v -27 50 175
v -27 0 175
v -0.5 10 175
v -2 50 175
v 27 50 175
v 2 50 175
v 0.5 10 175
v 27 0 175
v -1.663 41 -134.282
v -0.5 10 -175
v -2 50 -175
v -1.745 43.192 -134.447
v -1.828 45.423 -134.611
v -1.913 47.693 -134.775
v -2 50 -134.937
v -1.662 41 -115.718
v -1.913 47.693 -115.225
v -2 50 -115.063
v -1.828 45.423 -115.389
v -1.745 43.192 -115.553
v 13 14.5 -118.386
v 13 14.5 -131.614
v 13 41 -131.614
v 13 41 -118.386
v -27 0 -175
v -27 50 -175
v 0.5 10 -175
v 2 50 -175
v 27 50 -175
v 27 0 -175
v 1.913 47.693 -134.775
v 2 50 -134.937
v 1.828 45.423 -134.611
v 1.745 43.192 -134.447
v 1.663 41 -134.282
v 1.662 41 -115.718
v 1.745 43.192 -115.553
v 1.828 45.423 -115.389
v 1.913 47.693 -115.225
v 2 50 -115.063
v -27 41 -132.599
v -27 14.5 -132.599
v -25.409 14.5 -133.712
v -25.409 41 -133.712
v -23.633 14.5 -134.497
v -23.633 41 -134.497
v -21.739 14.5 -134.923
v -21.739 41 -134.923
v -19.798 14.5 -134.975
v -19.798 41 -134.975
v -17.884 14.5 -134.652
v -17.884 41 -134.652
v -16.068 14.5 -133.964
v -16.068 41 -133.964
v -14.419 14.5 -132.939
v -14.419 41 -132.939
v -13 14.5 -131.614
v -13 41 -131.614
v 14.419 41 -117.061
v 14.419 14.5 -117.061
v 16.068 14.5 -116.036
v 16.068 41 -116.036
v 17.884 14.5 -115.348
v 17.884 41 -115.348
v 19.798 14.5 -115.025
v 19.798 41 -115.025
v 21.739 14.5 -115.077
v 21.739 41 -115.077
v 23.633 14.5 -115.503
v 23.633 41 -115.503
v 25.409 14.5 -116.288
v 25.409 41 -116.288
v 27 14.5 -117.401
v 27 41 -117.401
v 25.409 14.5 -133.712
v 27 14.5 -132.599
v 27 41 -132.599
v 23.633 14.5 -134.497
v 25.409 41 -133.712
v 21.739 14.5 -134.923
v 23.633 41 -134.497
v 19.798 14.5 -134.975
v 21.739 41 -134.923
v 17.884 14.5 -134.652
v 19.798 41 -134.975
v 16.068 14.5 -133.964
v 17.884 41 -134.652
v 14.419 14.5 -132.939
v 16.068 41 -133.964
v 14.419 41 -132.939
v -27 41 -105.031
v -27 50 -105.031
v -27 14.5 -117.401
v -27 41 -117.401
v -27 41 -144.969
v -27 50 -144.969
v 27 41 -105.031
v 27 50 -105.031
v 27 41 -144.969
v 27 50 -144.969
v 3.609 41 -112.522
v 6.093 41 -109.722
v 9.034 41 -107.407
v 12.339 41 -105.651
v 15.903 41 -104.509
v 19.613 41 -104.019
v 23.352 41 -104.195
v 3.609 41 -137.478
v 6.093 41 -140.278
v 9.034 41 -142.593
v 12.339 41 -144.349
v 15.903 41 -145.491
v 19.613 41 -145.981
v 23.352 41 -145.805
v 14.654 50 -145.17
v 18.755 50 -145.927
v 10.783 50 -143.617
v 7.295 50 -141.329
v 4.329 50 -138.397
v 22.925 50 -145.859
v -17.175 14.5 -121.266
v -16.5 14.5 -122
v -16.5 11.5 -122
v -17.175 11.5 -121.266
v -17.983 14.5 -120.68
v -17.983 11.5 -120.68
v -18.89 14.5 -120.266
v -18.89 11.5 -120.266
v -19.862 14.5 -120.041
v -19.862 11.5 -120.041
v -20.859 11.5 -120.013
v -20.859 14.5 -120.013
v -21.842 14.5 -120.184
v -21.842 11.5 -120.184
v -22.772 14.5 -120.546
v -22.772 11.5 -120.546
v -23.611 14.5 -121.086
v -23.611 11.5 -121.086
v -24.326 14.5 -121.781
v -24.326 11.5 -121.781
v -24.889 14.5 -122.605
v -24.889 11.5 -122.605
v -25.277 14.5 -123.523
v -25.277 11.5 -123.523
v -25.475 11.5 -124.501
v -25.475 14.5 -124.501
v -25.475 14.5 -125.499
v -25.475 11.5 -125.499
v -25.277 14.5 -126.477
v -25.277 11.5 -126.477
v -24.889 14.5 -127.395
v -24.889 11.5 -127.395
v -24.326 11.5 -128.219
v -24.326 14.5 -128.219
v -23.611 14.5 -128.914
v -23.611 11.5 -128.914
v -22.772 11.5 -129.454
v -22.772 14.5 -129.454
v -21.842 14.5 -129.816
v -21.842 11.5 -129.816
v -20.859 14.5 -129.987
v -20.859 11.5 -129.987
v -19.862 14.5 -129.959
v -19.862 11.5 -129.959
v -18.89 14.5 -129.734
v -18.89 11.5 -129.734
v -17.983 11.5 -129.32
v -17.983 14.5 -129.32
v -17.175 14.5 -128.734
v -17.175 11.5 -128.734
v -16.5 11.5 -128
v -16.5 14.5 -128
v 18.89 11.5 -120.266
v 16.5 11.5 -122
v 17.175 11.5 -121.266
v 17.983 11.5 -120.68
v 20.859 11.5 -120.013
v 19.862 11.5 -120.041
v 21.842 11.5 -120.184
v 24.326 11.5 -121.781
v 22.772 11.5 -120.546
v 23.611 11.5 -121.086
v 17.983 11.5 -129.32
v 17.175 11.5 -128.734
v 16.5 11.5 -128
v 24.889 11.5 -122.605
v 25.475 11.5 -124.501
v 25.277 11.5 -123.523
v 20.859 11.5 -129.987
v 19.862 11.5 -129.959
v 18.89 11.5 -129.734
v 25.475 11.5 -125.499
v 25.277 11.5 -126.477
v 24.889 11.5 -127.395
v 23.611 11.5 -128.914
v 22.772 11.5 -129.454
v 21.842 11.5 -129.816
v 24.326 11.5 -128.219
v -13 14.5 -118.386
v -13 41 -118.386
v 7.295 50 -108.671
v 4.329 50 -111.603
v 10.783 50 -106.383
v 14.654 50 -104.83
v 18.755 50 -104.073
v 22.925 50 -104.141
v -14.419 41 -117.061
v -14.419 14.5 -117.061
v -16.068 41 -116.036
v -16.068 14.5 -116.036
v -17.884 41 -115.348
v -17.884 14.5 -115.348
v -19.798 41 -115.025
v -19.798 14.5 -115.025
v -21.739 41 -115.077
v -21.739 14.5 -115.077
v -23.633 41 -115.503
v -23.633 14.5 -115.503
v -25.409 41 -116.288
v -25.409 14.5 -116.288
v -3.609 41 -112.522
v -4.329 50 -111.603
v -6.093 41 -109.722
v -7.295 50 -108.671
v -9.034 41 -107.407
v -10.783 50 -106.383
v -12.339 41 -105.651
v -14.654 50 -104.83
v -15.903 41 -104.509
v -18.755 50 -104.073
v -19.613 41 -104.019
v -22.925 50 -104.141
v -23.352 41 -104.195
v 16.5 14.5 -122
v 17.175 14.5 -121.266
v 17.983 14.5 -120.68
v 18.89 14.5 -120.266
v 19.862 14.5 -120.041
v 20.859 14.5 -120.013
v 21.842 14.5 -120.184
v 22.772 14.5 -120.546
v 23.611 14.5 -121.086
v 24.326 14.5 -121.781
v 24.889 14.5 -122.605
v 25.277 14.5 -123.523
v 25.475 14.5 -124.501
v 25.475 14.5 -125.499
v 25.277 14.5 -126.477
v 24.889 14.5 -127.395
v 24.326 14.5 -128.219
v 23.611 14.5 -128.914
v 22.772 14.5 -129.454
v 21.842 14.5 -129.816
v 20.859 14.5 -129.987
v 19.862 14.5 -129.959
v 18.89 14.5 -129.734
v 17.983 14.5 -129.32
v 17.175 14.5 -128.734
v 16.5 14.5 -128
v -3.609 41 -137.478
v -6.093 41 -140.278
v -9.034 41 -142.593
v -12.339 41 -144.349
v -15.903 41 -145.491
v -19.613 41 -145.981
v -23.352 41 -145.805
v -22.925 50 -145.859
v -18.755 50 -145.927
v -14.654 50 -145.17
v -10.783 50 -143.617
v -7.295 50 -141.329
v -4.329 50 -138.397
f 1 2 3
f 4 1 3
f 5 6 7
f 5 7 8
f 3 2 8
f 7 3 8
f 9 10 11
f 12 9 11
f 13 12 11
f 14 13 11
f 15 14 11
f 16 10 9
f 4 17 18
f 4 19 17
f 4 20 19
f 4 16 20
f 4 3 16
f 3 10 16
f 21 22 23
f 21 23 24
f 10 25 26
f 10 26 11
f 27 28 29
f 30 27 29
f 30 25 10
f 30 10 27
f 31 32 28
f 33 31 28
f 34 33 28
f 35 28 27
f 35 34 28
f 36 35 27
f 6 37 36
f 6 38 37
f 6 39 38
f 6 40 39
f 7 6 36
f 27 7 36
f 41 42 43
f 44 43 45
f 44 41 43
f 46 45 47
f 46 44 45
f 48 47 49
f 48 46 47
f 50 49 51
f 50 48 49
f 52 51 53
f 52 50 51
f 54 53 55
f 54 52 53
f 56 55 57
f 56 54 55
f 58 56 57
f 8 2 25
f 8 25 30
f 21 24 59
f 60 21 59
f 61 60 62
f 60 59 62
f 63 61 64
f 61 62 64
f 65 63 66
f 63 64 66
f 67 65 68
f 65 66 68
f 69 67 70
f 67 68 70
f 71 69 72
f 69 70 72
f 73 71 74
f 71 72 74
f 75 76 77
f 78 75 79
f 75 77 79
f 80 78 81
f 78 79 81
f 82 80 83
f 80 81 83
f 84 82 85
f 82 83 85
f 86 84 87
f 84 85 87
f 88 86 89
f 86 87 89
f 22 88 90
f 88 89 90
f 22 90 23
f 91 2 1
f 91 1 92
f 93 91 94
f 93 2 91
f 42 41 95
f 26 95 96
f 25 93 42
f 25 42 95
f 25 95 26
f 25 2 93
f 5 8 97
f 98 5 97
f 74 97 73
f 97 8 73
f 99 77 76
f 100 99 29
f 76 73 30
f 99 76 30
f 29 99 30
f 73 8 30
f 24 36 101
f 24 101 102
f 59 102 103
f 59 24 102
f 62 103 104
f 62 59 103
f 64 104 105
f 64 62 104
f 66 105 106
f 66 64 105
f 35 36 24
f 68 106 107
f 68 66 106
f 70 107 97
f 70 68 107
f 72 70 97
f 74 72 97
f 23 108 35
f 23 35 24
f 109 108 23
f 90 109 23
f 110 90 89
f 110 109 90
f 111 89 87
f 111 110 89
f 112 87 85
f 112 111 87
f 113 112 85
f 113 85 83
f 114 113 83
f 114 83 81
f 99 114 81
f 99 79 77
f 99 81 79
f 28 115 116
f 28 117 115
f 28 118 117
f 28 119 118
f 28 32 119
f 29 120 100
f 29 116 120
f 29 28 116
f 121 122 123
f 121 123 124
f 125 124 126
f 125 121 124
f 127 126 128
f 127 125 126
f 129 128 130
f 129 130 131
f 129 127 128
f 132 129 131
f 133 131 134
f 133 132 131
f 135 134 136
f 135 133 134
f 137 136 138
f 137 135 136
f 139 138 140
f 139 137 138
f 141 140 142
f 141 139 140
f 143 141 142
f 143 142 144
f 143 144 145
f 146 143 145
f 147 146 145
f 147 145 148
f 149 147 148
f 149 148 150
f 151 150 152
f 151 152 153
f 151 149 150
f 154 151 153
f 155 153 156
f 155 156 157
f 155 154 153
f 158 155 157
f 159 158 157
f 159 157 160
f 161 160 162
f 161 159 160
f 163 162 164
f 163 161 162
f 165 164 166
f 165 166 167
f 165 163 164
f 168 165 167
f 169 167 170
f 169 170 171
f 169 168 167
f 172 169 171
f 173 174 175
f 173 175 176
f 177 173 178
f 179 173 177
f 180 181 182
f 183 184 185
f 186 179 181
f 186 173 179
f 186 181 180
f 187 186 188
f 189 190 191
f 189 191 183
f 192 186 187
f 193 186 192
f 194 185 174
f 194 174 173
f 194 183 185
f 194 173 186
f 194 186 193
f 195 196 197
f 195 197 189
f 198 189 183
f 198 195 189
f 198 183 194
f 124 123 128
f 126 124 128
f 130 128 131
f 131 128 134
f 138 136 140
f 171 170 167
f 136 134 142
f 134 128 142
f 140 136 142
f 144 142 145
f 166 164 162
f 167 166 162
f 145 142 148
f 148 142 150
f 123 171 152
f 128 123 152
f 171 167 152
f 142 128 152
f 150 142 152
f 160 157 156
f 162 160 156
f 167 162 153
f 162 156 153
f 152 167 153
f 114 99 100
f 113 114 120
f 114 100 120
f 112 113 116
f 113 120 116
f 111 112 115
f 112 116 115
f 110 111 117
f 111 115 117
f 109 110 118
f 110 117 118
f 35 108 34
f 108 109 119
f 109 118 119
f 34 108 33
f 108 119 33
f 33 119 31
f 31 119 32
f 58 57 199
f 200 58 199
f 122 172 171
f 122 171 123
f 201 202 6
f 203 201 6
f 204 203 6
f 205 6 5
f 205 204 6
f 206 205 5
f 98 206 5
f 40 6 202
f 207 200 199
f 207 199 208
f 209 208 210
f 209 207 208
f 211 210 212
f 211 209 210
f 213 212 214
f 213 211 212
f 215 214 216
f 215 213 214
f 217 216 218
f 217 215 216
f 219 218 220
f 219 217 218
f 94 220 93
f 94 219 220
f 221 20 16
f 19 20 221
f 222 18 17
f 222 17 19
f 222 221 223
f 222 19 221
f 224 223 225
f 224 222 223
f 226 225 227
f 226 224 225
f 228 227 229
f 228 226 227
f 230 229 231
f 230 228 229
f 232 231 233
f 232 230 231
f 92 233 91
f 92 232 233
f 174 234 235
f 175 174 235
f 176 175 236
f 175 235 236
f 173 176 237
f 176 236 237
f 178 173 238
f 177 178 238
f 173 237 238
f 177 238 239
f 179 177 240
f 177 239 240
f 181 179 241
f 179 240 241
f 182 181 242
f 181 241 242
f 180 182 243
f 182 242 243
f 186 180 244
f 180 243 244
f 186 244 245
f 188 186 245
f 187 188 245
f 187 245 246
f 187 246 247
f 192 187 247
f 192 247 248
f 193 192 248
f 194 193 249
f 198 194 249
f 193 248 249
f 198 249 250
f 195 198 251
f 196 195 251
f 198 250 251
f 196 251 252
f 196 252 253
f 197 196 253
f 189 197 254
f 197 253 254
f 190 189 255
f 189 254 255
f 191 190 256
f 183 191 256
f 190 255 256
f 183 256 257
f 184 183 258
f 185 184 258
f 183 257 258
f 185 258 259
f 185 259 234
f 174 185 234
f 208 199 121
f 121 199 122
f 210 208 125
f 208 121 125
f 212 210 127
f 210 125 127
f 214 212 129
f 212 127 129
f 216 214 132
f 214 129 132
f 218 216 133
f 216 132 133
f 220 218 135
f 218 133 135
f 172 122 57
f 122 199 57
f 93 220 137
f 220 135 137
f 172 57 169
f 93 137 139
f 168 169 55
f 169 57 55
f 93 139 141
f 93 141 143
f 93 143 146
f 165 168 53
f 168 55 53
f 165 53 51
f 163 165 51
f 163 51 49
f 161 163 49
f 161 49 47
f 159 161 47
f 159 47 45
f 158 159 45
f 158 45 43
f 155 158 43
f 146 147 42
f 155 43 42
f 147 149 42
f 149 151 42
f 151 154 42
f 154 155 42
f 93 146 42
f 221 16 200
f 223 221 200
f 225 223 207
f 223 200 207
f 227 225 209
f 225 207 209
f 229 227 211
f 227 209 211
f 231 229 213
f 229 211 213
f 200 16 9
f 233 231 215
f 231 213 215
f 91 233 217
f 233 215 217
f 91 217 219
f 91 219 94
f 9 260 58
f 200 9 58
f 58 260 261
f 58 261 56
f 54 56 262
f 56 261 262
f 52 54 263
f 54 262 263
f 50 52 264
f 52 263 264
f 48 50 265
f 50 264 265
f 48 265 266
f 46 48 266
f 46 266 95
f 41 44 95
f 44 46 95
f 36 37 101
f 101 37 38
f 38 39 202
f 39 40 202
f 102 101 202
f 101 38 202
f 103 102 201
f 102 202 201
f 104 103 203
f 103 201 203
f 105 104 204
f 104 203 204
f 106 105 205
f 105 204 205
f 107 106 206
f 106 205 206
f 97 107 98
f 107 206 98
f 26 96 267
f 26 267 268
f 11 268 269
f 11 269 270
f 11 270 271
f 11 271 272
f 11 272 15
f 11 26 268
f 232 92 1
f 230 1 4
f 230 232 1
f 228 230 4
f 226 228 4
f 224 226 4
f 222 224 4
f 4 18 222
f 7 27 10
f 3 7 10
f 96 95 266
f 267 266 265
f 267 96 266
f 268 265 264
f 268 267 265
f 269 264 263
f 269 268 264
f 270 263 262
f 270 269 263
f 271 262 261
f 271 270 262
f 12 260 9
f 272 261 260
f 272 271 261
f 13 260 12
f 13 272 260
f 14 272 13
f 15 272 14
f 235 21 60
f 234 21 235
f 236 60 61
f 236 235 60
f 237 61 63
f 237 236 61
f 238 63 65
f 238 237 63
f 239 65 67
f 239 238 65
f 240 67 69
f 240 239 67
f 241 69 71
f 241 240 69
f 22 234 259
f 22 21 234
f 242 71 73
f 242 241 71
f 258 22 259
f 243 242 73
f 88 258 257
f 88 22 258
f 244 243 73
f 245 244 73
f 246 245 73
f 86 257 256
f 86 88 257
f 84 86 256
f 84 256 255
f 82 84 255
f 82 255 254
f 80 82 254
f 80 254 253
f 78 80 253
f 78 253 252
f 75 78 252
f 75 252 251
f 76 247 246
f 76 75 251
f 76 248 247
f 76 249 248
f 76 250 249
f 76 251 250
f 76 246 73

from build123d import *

# Parameters (mm, degrees)
SKETCH1_W           = 54
SKETCH1_H           = 350
BOSS_EXTRUDE1_DEPTH = 50
CUT_EXTRUDE2_DEPTH  = 355.582853505
SKETCH7_R           = 21
SKETCH7_R_2         = 10
CUT_EXTRUDE4_DEPTH  = 9
CUT_EXTRUDE5_DEPTH  = 35.5
CUT_EXTRUDE6_DEPTH  = 3
CUT_EXTRUDE7_DEPTH  = 9


with BuildPart() as part:
    # Sketch1 → Boss-Extrude1 (new body)
    with BuildSketch(Plane(origin=(0, 0, 0), x_dir=(1, 0, 0), z_dir=(0, 1, 0))):
        Rectangle(SKETCH1_W, SKETCH1_H)
    extrude(amount=BOSS_EXTRUDE1_DEPTH)

    # Sketch3 → Cut-Extrude2 (cut, through all)
    with BuildSketch(Plane.XY.offset(175)):
        Polygon((-0.5, 10), (-2, 50), (2, 50), (0.5, 10), align=None)
    extrude(amount=-CUT_EXTRUDE2_DEPTH, mode=Mode.SUBTRACT)

    # Sketch7 → Cut-Extrude4 (cut)
    with BuildSketch(Plane(origin=(0, 50, 0), x_dir=(1, 0, 0), z_dir=(0, 1, 0))):
        with Locations((20.5, 125)):
            Circle(SKETCH7_R)
        with Locations((20.5, 125)):
            Circle(SKETCH7_R_2, mode=Mode.SUBTRACT)
    cut_extrude4 = extrude(amount=-CUT_EXTRUDE4_DEPTH, mode=Mode.SUBTRACT)

    # Sketch9 → Cut-Extrude5 (cut)
    with BuildSketch(Plane(origin=(0, 50, 0), x_dir=(1, 0, 0), z_dir=(0, 1, 0))):
        with BuildLine():
            Line((13, 131.614378278), (13, 118.385621722))
            ThreePointArc((13, 118.385621722), (30.5, 125), (13, 131.614378278))
        make_face()
    cut_extrude5 = extrude(amount=-CUT_EXTRUDE5_DEPTH, mode=Mode.SUBTRACT)

    # Sketch10 → Cut-Extrude6 (cut)
    with BuildSketch(Plane(origin=(0, 14.5, 0), x_dir=(1, 0, 0), z_dir=(0, 1, 0))):
        with BuildLine():
            Line((16.5, 128), (16.5, 122))
            ThreePointArc((16.5, 122), (25.5, 125), (16.5, 128))
        make_face()
    cut_extrude6 = extrude(amount=-CUT_EXTRUDE6_DEPTH, mode=Mode.SUBTRACT)

    # Sketch11 → Cut-Extrude7 (cut)
    with BuildSketch(Plane(origin=(0, 50, 0), x_dir=(1, 0, 0), z_dir=(0, 1, 0))):
        with BuildLine():
            Line((13, 131.614378278), (13, 118.385621722))
            ThreePointArc((13, 118.385621722), (10.5, 125), (13, 131.614378278))
        make_face()
    cut_extrude7 = extrude(amount=-CUT_EXTRUDE7_DEPTH, mode=Mode.SUBTRACT)

    # Mirror1: Cut-Extrude4, Cut-Extrude5, Cut-Extrude6, Cut-Extrude7 across plane
    add(cut_extrude4.mirror(Plane(origin=(0, 0, 0), x_dir=(0, 0, 1), z_dir=(1, 0, 0))), mode=Mode.SUBTRACT)
    add(cut_extrude5.mirror(Plane(origin=(0, 0, 0), x_dir=(0, 0, 1), z_dir=(1, 0, 0))), mode=Mode.SUBTRACT)
    add(cut_extrude6.mirror(Plane(origin=(0, 0, 0), x_dir=(0, 0, 1), z_dir=(1, 0, 0))), mode=Mode.SUBTRACT)
    add(cut_extrude7.mirror(Plane(origin=(0, 0, 0), x_dir=(0, 0, 1), z_dir=(1, 0, 0))), mode=Mode.SUBTRACT)


solid = part.part
